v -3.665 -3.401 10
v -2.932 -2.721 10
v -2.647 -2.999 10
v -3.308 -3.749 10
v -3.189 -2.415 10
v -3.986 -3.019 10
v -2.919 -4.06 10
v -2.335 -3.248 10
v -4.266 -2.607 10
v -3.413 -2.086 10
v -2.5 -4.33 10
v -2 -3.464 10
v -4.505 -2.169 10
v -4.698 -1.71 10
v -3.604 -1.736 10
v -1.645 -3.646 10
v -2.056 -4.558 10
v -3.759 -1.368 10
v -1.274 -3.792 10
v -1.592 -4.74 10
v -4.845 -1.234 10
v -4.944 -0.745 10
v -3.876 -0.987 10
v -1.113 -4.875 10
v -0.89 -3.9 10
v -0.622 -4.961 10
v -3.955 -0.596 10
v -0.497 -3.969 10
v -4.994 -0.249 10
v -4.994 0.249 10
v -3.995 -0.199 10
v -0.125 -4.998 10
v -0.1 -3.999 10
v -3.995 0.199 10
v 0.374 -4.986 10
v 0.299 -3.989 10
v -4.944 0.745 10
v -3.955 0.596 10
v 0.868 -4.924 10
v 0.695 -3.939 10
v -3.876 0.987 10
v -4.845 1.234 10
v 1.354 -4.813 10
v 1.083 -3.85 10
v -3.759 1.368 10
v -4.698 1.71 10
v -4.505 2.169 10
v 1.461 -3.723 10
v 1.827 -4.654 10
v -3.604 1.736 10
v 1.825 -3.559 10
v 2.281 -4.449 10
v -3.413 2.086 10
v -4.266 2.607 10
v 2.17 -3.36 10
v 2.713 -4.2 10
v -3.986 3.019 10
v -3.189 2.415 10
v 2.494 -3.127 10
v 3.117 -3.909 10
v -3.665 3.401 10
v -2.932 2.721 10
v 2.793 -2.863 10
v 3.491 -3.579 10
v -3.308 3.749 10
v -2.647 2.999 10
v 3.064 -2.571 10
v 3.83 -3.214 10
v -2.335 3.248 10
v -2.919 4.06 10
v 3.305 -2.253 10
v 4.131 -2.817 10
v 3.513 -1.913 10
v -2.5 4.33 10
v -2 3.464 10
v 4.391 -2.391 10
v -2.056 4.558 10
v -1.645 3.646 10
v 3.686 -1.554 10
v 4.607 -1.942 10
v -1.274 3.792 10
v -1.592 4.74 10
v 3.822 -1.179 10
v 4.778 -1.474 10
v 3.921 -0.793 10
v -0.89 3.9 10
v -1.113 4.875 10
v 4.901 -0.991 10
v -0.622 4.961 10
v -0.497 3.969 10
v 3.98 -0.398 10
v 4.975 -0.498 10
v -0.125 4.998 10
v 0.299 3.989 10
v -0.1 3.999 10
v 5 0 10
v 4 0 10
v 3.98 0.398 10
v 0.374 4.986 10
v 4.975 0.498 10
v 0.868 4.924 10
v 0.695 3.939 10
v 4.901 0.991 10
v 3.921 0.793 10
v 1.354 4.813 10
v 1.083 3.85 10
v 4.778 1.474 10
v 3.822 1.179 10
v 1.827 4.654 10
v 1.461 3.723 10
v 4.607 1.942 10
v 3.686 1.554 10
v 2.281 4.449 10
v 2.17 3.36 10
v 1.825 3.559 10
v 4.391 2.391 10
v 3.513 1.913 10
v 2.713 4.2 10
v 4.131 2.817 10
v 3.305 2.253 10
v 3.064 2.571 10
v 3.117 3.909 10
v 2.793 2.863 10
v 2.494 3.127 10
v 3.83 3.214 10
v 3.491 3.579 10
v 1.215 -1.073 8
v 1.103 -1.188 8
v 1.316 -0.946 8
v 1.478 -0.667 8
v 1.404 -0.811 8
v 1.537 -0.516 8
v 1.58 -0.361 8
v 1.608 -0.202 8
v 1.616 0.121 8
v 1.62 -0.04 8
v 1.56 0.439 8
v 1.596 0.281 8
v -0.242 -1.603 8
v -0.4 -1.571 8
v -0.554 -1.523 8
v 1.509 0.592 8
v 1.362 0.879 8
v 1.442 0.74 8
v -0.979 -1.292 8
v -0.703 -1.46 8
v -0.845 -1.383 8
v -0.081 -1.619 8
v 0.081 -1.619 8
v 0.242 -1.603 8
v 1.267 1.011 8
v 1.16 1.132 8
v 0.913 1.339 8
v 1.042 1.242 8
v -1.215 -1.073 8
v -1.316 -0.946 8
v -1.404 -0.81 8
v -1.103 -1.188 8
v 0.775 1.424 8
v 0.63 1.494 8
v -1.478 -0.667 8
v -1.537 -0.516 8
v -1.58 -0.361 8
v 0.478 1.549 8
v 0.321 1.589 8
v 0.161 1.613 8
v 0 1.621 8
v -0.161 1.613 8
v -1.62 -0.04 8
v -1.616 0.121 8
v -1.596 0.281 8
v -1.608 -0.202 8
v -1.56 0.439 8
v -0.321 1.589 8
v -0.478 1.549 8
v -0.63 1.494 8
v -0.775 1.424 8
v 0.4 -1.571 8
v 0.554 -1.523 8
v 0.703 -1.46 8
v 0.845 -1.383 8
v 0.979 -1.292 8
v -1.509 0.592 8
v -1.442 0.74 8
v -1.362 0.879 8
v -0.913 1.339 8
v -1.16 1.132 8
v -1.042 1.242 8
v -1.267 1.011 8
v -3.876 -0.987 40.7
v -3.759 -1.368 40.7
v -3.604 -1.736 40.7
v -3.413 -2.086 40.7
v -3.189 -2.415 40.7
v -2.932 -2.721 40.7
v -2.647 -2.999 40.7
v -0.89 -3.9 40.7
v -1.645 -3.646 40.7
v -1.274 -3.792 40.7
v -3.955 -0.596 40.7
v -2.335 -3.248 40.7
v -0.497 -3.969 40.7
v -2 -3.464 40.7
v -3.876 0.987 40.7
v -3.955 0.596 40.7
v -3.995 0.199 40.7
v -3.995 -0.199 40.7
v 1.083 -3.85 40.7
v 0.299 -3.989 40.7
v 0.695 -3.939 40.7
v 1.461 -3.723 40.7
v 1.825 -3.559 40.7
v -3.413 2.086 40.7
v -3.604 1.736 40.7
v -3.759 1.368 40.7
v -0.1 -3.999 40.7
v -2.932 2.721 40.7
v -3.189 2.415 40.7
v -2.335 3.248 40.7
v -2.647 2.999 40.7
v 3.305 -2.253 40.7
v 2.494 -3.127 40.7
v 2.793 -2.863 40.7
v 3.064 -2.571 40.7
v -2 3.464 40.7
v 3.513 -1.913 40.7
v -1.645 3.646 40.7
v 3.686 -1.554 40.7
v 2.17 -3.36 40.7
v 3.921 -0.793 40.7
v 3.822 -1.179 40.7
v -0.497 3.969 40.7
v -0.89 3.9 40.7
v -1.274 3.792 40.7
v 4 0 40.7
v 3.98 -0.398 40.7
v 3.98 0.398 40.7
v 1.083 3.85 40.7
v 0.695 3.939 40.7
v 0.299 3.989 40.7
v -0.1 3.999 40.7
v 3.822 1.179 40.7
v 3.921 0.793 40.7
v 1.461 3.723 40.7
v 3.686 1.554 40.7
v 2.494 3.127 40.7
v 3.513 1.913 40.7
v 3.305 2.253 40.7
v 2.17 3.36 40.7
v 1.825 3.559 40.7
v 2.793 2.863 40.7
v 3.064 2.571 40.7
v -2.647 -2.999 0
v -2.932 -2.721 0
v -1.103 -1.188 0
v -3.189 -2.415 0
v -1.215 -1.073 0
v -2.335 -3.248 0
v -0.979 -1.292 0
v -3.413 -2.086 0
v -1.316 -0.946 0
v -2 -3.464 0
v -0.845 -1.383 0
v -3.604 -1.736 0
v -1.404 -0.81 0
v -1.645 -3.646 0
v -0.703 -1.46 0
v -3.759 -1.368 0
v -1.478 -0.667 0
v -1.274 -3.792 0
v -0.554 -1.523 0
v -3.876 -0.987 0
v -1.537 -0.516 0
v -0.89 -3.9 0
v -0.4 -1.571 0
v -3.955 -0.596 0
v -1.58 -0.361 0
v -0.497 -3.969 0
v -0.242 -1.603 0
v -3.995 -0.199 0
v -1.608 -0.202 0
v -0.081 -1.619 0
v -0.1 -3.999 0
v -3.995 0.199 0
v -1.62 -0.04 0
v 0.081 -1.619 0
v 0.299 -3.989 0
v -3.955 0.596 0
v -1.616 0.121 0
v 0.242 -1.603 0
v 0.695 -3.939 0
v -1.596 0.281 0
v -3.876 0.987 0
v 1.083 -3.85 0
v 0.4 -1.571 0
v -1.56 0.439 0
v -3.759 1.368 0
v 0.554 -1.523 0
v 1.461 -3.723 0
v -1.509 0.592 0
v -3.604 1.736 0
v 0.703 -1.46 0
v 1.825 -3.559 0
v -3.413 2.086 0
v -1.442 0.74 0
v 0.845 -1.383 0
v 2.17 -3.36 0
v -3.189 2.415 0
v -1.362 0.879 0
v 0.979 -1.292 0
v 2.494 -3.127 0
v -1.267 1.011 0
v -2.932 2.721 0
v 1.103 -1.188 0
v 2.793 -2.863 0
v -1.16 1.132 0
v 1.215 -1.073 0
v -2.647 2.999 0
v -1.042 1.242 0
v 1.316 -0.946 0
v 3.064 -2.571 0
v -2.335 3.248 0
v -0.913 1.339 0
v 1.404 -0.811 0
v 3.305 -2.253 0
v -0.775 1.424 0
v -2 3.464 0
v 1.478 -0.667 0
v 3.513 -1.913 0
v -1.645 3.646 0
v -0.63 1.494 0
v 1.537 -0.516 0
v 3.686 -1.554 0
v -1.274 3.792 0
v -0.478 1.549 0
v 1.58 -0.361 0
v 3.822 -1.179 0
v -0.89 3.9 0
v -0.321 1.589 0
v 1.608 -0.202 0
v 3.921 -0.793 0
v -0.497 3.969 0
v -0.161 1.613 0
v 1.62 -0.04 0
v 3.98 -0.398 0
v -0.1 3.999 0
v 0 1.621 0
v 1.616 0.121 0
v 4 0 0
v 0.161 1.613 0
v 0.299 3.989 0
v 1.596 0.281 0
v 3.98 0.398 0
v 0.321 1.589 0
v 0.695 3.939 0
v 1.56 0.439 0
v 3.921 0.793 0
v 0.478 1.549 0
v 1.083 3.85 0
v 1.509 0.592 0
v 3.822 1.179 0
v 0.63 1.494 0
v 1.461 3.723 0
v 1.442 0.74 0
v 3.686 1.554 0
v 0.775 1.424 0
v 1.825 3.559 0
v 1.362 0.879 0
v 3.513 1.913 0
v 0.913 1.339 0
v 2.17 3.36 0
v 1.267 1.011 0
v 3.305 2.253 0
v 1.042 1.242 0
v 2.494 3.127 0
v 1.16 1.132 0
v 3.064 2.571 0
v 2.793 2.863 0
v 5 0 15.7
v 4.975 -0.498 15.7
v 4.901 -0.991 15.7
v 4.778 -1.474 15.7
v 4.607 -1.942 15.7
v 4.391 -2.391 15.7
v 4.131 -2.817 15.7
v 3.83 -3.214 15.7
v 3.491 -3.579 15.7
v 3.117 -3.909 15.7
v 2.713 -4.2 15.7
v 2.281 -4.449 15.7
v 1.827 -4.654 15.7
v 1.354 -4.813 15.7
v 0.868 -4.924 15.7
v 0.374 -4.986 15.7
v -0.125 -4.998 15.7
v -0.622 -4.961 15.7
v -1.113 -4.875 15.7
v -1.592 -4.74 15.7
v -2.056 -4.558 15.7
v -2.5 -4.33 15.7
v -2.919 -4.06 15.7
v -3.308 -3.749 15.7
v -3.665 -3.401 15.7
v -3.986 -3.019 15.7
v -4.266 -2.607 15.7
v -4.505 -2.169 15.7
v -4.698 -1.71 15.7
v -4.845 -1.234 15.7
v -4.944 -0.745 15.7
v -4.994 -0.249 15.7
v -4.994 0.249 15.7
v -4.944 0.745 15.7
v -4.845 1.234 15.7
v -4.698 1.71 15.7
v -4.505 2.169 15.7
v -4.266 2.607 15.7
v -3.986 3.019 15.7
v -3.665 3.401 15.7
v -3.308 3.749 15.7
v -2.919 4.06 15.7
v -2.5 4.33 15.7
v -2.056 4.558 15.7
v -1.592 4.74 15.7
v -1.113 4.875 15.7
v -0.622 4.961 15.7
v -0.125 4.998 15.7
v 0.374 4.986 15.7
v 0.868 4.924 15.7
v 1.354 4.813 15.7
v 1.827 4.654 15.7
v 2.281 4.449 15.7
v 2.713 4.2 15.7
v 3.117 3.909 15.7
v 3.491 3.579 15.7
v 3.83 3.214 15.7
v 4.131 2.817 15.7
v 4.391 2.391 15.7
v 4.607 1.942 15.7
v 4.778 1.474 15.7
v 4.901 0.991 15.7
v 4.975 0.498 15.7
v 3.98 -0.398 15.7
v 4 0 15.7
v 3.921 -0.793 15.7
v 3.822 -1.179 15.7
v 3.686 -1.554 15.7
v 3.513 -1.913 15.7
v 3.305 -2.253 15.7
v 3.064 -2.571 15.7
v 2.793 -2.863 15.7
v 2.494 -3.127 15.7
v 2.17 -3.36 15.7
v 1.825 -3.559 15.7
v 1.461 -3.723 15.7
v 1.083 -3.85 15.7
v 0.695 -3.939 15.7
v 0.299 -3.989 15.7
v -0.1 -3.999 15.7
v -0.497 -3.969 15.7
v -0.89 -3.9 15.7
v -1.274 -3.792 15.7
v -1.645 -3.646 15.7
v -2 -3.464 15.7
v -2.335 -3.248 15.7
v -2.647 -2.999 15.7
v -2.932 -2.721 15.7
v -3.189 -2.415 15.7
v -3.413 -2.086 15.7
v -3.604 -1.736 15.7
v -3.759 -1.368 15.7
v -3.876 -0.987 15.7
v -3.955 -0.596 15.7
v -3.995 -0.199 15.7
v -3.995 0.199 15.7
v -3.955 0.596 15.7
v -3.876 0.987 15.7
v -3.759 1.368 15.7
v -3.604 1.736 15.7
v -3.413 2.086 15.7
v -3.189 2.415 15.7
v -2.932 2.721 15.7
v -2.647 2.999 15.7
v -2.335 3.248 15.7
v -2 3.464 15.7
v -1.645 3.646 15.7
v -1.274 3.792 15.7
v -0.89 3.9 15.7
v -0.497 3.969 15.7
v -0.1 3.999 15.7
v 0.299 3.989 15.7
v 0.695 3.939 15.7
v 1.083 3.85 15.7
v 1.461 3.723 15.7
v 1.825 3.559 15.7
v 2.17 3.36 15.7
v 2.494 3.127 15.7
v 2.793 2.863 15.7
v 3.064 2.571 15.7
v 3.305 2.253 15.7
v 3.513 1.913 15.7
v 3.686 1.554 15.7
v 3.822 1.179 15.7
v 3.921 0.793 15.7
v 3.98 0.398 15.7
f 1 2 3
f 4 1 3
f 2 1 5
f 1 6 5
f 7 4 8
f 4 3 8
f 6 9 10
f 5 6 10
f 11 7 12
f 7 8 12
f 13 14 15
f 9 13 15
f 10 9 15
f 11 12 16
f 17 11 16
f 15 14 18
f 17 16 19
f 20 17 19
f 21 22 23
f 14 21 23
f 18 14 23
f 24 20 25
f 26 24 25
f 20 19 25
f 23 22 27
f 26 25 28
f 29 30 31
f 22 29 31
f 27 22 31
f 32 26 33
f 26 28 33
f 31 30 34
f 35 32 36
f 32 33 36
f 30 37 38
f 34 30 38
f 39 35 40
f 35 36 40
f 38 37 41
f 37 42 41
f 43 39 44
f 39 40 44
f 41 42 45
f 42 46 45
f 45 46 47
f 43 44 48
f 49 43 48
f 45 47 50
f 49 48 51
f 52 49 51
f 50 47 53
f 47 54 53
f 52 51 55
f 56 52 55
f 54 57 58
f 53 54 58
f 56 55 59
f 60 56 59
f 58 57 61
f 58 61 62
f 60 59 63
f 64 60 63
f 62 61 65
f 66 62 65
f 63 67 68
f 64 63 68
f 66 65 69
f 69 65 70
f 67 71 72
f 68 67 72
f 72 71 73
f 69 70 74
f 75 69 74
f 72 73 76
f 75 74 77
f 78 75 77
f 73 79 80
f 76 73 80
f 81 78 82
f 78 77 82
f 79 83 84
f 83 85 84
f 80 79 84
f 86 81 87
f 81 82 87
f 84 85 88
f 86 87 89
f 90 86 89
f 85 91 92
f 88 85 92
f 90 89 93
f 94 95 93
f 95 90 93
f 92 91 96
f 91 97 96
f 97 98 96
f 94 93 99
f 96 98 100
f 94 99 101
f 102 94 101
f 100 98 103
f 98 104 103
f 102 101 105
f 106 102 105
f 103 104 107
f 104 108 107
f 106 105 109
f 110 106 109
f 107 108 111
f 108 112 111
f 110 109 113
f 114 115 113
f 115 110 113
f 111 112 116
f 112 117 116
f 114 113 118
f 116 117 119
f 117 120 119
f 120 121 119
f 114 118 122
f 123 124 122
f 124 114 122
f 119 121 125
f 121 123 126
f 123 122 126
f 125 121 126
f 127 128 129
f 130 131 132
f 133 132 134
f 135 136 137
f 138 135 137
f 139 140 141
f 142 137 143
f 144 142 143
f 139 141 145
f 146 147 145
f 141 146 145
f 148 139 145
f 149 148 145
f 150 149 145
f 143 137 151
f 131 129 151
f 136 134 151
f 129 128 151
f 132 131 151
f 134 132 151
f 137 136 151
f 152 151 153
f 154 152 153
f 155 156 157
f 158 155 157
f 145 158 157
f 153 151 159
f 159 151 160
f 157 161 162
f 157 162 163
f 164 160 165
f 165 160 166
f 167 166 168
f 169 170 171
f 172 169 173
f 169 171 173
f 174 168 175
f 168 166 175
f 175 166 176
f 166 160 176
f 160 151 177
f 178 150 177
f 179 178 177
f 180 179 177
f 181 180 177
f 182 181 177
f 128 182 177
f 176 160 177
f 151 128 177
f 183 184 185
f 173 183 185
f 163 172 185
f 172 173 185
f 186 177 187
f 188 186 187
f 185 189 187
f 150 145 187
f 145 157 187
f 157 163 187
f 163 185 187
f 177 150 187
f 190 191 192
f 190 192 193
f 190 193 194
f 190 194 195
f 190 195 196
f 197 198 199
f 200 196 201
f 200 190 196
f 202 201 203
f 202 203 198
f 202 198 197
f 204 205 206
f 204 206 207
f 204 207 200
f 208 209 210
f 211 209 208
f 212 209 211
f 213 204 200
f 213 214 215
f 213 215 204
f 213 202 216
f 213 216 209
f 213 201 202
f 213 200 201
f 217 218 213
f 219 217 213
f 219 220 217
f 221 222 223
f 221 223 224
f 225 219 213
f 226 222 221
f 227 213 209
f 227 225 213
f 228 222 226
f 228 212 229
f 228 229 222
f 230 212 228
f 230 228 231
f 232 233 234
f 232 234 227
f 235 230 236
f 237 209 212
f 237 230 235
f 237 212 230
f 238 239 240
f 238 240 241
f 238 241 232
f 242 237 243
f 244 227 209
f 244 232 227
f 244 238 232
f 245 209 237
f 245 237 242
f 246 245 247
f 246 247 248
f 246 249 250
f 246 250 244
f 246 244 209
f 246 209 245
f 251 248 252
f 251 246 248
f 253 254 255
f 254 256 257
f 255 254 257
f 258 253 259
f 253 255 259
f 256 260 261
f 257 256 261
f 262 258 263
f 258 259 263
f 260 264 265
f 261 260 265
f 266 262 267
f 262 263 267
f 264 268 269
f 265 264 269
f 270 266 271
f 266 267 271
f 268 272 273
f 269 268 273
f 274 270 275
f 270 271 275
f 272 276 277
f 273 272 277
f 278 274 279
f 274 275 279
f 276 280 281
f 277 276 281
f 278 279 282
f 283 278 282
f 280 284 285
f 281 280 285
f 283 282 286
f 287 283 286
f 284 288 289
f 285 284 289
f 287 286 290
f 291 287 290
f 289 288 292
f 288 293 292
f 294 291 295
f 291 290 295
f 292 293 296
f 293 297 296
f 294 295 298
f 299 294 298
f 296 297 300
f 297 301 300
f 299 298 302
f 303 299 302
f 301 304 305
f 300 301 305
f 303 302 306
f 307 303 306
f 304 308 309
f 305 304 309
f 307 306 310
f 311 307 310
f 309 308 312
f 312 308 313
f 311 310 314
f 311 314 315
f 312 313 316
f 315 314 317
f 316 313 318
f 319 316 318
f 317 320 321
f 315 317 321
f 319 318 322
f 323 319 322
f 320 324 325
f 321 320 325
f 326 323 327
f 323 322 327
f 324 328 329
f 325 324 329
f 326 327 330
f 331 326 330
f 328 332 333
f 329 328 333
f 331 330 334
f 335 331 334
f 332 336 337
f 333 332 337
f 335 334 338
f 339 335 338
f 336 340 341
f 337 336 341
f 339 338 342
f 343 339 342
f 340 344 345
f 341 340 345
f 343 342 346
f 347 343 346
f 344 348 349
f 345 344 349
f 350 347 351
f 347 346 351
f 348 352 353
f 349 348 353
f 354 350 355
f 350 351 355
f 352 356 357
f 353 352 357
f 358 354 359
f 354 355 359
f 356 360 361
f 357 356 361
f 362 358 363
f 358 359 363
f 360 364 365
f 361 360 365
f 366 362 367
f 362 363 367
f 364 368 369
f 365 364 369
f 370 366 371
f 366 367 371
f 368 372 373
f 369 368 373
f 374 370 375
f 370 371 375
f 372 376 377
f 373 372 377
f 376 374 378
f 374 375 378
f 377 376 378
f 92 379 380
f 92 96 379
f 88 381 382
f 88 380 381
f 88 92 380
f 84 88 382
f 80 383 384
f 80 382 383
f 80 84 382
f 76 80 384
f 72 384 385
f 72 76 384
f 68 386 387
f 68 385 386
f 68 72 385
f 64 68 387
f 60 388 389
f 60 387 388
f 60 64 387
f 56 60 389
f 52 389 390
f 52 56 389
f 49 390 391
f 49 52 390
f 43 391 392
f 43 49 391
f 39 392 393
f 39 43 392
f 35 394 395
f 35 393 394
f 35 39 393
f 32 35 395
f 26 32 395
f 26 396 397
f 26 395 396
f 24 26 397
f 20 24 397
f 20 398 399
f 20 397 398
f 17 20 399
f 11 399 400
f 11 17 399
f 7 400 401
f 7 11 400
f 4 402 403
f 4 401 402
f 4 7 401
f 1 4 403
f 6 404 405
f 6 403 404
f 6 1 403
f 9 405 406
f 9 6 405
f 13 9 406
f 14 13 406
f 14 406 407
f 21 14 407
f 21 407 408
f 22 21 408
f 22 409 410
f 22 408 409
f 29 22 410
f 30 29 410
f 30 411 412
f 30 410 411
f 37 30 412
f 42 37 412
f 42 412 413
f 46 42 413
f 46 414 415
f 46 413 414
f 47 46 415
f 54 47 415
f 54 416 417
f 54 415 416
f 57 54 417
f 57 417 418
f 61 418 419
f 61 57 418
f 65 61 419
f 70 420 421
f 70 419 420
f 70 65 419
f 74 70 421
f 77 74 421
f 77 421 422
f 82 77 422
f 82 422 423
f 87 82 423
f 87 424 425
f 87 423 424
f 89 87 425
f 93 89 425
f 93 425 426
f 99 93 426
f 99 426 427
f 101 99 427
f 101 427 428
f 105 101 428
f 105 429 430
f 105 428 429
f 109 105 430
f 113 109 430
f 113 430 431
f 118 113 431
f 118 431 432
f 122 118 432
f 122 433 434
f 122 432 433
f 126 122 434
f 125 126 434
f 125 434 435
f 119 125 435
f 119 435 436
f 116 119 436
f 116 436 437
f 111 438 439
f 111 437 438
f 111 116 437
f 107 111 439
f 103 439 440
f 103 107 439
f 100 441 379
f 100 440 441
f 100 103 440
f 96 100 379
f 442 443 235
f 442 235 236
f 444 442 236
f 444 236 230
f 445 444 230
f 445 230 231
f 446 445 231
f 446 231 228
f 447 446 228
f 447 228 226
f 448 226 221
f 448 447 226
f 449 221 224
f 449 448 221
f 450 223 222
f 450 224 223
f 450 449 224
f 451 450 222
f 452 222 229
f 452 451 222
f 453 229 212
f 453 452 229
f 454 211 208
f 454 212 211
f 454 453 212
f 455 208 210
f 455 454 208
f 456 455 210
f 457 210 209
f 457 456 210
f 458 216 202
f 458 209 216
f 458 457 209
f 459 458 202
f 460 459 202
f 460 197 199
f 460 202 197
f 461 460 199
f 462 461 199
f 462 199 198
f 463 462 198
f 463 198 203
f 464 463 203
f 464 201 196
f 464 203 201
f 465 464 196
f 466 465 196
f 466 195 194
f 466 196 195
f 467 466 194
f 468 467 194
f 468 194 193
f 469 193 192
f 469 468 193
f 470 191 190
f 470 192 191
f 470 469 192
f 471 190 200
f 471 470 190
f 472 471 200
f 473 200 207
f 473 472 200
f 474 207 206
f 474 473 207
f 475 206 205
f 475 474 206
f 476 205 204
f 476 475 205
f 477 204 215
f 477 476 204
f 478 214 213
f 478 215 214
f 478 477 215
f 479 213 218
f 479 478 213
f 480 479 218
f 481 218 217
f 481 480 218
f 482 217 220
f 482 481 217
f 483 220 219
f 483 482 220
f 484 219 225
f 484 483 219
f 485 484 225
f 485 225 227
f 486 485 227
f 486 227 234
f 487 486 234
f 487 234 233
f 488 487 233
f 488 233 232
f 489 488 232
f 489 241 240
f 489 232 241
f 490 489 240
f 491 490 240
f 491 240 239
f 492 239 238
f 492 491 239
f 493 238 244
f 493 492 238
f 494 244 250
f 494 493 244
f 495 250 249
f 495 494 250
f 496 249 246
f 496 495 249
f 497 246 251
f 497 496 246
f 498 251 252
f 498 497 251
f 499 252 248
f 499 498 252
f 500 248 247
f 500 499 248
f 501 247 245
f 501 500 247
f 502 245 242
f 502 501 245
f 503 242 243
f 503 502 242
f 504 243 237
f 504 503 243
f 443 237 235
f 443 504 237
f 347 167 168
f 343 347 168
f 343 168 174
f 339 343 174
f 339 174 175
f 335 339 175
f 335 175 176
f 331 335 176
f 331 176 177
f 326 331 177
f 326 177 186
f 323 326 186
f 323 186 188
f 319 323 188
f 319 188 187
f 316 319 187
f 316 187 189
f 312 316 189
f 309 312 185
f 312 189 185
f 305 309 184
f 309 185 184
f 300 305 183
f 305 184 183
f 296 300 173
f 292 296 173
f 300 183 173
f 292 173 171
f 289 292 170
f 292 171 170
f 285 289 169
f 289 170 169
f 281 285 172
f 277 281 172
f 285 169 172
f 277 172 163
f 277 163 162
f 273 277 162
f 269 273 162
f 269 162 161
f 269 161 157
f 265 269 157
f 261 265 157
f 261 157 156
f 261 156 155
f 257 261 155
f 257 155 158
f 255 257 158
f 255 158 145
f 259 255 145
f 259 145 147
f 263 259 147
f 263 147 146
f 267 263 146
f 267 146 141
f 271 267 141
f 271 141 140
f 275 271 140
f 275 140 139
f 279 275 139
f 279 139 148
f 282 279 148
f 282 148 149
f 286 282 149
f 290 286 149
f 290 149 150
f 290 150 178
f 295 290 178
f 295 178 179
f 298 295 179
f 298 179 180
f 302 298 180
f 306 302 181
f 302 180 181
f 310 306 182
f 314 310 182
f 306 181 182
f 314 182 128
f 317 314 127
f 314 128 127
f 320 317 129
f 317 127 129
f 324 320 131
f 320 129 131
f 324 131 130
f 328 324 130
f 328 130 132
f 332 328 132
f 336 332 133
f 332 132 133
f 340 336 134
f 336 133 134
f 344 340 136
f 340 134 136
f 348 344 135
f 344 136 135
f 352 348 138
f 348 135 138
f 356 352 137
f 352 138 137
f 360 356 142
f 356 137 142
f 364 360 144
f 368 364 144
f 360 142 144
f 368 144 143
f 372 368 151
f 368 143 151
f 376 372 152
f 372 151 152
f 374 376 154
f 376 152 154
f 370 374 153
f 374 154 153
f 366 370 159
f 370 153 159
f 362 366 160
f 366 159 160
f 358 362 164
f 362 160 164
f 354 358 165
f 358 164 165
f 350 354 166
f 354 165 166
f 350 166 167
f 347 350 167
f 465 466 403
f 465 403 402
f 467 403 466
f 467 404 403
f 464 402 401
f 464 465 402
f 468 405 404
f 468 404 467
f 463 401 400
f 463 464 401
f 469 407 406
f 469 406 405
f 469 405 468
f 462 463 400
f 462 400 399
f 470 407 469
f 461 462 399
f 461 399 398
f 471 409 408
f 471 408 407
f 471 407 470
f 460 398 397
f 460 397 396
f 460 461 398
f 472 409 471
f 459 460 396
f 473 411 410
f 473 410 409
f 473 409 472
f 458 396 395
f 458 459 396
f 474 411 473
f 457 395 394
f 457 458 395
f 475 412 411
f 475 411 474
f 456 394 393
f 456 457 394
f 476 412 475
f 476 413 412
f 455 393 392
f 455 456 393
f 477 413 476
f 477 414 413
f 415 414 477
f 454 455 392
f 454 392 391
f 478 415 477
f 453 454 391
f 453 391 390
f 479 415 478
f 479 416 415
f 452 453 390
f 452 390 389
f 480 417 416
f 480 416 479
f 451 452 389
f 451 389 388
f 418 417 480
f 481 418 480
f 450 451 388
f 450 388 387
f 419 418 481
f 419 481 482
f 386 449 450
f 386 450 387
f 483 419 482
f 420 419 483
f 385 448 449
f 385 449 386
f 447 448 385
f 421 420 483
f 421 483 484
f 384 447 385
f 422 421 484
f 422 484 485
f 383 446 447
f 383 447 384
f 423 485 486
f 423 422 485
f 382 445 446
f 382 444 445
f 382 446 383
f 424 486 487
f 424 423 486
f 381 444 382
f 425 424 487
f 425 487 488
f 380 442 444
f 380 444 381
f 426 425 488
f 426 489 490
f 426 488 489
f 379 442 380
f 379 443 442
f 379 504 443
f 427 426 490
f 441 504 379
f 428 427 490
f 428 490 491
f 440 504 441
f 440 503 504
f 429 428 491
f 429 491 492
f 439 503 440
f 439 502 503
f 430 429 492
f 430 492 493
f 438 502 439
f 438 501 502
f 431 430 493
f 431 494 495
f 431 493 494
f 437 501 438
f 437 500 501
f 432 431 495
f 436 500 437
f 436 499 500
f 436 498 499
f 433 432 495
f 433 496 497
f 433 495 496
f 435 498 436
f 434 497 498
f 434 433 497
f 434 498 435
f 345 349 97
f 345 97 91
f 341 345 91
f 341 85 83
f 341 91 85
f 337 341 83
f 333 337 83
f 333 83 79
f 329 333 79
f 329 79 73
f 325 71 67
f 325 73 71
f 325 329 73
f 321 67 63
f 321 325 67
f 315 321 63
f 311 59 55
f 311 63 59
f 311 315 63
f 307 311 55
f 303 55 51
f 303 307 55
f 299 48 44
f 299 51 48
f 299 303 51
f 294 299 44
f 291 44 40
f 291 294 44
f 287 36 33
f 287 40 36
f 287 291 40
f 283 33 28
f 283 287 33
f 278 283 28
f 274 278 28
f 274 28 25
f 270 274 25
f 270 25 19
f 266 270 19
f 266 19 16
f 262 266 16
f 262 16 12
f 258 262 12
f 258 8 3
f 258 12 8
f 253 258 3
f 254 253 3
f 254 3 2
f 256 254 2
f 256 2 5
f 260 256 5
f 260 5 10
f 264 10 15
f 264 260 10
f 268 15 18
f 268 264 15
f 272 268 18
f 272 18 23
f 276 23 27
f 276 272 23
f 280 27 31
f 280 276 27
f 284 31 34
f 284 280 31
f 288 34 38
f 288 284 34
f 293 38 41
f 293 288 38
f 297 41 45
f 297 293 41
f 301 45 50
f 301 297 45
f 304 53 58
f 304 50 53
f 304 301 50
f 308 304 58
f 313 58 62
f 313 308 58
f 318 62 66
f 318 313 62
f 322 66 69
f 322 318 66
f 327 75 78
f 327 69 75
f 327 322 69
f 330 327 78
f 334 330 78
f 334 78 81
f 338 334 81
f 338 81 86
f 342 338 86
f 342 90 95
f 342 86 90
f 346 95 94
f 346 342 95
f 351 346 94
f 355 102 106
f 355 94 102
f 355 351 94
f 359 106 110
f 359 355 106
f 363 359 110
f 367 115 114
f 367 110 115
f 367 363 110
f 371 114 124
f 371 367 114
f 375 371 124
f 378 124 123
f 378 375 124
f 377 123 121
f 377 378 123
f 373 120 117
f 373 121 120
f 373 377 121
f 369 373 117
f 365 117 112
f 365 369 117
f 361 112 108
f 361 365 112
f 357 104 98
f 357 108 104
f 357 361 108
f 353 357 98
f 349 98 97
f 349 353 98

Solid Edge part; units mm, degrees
sketch "Sketch1" plane through (0, 0, 0) normal (0, 0, 1) x (1, 0, 0)
  circle A0 centre (0, 0) radius 4
  dimension "D1" = 8
extrude "Protrusion1" add sketch "Sketch1" along normal blind 10
sketch "Sketch2" plane through (0, 0, 10) normal (0, 0, 1) x (1, 0, 0)
  circle A0 centre (0, 0) radius 5
  dimension "D1" = 10
extrude "ExtrudedProtrusion_2" add sketch "Sketch2" along normal blind 5.7
sketch "Sketch3" plane through (0, 0, 15.7) normal (0, 0, 1) x (1, 0, 0)
  circle A0 centre (0, 0) radius 4
  dimension "D1" = 8
extrude "ExtrudedProtrusion_3" add sketch "Sketch3" along normal blind 25
hole "Hole_1" at (0, 0, 0) direction (0, 0, 1) diameter 3.242 depth 8
cosmetic_thread "Thread1" size "Tr 8 x 2"
properties material "Aluminum, 6061-T6"
